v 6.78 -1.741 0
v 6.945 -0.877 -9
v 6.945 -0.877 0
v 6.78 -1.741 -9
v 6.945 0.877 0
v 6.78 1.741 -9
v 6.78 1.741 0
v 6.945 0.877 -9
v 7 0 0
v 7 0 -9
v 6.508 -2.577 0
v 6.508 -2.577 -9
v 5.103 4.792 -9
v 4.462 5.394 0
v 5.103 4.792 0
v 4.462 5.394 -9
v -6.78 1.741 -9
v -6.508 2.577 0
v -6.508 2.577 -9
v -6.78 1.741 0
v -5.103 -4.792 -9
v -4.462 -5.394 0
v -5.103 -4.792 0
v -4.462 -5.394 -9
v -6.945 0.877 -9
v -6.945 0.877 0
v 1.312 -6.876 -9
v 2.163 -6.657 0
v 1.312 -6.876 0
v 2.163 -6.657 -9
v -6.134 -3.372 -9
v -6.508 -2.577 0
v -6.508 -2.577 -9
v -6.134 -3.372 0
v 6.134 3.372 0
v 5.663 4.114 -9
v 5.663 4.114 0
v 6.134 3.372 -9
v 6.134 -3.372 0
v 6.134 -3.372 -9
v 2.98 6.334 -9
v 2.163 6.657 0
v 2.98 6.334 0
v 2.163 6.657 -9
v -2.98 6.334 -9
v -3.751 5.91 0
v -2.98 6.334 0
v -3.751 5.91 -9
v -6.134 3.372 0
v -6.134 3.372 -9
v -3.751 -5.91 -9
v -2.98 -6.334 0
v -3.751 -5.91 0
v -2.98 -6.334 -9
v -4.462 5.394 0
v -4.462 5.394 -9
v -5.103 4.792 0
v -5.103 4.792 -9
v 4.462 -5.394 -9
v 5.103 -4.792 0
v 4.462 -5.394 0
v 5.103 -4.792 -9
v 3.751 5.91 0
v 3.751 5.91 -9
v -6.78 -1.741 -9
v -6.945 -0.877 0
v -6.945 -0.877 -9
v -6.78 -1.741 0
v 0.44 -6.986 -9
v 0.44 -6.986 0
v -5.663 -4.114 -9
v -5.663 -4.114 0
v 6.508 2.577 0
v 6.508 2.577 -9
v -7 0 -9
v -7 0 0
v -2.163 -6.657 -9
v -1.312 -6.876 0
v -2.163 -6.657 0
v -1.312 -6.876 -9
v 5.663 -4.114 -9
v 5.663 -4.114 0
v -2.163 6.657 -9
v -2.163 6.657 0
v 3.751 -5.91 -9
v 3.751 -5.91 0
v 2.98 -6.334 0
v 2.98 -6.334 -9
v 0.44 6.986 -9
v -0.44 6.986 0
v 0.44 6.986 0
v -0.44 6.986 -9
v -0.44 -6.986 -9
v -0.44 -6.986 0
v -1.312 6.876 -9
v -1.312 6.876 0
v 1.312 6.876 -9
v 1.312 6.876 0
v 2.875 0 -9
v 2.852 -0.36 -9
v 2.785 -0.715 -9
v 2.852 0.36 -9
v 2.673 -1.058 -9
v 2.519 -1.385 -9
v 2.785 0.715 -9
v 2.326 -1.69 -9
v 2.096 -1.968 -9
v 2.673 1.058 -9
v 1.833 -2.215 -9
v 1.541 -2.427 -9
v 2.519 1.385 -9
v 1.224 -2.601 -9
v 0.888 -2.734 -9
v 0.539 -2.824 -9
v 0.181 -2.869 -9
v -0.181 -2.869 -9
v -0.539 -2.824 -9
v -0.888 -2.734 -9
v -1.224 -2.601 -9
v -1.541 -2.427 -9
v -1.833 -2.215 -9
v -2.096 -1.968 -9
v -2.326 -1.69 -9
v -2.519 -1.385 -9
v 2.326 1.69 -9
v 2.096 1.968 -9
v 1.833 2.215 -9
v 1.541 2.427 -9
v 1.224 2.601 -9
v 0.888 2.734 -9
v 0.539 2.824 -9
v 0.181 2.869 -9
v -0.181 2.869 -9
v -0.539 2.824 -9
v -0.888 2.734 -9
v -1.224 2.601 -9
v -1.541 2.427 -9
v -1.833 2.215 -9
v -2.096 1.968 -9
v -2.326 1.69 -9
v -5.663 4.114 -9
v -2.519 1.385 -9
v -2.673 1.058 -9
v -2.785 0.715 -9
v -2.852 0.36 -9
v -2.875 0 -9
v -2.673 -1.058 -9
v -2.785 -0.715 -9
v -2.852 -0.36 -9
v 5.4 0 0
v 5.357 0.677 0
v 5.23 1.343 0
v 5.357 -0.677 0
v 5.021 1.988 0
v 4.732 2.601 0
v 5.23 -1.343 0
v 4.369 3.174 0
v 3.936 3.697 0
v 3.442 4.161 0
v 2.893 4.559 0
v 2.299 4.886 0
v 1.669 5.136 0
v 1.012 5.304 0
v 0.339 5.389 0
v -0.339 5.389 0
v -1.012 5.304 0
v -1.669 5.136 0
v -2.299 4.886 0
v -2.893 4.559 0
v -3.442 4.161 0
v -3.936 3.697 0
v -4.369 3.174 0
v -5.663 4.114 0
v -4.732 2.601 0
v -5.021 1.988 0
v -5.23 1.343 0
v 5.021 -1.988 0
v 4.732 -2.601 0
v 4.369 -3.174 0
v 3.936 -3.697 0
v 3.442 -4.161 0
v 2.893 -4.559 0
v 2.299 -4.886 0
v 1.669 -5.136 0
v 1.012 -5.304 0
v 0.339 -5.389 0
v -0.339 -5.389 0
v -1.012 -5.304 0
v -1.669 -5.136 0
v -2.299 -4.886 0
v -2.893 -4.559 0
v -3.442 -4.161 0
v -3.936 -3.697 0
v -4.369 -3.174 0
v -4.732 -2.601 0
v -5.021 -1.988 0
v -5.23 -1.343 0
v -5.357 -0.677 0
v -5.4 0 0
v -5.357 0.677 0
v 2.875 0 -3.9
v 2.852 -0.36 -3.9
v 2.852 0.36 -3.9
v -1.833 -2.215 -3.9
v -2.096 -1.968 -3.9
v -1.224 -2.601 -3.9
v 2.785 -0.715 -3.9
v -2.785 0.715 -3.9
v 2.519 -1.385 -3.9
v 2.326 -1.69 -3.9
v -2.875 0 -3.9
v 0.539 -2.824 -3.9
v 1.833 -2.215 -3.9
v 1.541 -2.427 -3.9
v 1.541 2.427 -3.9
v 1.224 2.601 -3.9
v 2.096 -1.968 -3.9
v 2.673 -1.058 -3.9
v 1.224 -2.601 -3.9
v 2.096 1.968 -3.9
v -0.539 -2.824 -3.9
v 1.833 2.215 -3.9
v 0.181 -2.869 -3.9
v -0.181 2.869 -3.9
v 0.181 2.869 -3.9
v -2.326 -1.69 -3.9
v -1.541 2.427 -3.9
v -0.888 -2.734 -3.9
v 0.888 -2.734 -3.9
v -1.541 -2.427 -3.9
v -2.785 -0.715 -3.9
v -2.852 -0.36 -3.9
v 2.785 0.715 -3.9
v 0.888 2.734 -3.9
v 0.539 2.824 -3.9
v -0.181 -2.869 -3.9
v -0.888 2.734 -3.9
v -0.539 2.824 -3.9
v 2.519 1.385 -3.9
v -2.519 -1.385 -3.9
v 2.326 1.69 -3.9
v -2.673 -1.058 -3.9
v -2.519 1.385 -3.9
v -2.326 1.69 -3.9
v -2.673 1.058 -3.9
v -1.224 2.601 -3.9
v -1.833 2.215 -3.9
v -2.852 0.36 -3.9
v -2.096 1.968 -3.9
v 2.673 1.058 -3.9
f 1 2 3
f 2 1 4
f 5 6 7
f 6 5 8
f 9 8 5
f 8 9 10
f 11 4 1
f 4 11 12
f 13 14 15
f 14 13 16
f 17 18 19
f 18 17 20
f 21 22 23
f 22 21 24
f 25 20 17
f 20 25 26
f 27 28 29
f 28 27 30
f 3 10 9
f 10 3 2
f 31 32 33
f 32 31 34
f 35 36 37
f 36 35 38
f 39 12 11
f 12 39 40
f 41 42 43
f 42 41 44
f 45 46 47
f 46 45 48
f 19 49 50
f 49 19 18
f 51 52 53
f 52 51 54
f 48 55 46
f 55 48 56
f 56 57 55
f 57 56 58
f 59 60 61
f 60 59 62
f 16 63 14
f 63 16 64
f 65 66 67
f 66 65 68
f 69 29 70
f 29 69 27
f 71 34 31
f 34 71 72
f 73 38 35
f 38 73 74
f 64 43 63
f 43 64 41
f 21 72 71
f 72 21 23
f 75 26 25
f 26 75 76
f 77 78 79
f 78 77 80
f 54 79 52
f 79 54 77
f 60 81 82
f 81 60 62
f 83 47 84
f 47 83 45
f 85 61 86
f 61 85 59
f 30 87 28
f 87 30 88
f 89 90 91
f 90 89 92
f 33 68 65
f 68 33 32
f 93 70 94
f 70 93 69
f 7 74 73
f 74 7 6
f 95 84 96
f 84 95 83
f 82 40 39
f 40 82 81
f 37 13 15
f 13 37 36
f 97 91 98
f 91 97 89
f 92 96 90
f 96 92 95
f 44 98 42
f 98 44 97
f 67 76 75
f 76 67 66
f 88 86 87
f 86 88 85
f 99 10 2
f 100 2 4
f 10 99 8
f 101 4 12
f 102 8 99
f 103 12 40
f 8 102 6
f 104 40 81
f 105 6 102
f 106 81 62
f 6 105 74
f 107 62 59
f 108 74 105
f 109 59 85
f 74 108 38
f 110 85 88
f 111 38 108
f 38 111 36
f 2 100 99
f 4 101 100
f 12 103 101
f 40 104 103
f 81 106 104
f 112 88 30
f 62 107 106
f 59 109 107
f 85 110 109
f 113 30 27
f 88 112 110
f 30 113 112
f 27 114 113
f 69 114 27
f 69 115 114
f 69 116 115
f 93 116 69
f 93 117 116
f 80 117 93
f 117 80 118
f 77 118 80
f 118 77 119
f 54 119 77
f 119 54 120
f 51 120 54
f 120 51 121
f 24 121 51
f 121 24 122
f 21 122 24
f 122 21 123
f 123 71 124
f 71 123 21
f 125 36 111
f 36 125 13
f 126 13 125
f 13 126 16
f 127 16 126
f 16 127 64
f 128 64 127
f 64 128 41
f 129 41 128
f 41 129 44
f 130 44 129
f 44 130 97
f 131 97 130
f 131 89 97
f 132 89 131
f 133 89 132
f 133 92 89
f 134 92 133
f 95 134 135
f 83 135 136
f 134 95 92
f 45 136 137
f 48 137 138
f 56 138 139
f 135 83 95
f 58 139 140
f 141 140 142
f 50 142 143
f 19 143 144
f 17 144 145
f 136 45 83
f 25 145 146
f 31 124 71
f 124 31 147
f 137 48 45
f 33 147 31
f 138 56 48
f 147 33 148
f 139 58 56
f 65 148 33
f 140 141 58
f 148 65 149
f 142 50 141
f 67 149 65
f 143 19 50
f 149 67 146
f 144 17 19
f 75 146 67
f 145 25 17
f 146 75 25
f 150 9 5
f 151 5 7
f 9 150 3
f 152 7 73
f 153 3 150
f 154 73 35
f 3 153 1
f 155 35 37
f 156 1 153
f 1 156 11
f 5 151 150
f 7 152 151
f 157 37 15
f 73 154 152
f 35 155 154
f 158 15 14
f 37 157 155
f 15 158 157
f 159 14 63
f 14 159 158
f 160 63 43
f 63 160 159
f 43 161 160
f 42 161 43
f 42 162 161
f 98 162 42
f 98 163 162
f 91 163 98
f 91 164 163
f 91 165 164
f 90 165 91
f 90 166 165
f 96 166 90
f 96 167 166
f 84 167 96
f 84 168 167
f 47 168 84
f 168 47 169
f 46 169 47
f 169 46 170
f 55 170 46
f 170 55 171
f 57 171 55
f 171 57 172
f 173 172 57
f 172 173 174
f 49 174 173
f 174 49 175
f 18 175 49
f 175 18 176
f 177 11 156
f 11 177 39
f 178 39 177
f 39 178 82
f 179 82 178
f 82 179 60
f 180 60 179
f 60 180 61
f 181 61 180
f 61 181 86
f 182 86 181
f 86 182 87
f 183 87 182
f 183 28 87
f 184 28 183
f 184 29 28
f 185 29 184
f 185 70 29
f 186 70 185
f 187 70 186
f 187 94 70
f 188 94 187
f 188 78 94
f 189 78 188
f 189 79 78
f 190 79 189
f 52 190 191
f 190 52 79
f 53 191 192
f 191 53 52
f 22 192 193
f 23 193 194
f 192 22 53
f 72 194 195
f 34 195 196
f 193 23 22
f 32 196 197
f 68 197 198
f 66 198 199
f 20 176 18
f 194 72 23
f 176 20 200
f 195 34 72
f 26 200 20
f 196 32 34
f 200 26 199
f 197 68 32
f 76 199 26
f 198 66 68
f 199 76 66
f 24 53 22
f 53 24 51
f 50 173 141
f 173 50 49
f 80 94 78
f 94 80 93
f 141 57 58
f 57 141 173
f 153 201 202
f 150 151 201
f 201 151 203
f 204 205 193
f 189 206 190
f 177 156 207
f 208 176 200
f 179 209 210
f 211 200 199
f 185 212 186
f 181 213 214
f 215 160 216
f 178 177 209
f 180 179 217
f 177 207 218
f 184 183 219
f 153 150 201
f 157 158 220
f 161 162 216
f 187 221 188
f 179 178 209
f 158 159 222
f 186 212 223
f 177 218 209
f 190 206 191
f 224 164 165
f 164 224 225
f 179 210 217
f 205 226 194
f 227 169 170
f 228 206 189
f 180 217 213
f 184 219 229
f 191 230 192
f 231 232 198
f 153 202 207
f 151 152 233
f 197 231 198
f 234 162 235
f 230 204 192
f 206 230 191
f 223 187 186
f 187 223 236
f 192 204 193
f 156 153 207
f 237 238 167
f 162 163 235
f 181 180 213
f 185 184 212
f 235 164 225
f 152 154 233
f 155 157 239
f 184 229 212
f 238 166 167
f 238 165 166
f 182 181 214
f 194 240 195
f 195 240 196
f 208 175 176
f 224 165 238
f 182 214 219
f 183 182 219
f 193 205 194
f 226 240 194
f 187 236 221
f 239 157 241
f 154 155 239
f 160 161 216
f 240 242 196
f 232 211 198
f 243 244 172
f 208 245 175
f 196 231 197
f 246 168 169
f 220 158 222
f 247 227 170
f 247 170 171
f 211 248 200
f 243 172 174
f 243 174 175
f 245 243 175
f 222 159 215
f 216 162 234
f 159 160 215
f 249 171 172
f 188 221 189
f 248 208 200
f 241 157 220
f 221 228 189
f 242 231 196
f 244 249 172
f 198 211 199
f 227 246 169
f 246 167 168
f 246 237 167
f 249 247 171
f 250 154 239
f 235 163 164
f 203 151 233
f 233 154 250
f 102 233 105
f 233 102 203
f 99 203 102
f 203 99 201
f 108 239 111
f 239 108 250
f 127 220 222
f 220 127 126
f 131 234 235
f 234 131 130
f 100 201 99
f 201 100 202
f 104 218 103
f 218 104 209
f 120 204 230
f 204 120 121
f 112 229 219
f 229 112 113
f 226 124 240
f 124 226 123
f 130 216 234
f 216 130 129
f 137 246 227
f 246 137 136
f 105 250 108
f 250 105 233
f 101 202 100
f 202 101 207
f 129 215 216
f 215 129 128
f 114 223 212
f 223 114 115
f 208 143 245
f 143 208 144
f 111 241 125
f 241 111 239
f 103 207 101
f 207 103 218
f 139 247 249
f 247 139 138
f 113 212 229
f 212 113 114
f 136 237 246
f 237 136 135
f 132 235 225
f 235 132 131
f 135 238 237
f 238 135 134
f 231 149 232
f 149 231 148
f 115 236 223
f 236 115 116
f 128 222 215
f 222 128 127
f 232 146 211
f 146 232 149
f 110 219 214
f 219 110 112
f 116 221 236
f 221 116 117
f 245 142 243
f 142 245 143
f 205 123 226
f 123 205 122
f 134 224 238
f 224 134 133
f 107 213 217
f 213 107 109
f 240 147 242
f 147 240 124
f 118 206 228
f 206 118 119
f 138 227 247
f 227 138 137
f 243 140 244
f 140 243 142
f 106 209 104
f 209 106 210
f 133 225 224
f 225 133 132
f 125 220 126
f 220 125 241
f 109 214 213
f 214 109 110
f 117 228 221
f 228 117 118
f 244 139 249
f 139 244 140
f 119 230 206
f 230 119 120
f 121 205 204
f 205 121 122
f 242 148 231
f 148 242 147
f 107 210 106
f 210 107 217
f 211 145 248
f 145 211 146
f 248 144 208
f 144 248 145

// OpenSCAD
$fn = 50;


difference() {
	union() {
		translate(v = [0, 0, -9.0000000000]) {
			cylinder(h = 9, r = 7.0000000000);
		}
		translate(v = [0, 0, -9.0000000000]) {
			cylinder(h = 9, r = 2.8750000000);
		}
	}
	union() {
		translate(v = [0, 0, 0]) {
			rotate(a = [0, 0, 0]) {
				difference() {
					union() {
						#translate(v = [0, 0, -9.0000000000]) {
							cylinder(h = 9, r = 2.6000000000);
						}
						#translate(v = [0, 0, -3.9000000000]) {
							cylinder(h = 3.9000000000, r1 = 2.8750000000, r2 = 5.4000000000);
						}
						#translate(v = [0, 0, -9.0000000000]) {
							cylinder(h = 9, r = 2.8750000000);
						}
						#translate(v = [0, 0, -9.0000000000]) {
							cylinder(h = 9, r = 2.6000000000);
						}
					}
					union();
				}
			}
		}
	}
}
